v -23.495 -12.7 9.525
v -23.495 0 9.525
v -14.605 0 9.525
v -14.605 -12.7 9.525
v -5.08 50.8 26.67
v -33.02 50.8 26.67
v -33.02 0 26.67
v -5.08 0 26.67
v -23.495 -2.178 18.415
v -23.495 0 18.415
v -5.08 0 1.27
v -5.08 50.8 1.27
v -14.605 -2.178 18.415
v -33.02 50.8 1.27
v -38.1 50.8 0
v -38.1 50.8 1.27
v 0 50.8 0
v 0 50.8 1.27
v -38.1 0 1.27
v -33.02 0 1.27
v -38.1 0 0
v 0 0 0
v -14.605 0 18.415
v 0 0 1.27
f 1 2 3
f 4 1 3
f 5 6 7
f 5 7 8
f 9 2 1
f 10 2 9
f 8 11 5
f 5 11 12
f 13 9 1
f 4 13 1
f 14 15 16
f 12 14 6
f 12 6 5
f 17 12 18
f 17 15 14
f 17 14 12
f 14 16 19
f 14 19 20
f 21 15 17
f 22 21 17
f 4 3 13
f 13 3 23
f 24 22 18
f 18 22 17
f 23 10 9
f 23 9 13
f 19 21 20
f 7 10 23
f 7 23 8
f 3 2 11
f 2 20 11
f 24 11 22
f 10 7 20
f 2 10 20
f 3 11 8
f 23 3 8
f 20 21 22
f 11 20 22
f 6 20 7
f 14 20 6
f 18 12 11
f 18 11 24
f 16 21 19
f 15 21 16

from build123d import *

# Parameters (mm, degrees)
F0_W     = 38.1
F0_H     = 50.8
F1_DEPTH = 1.27
F2_W     = 27.94
F2_H     = 50.8
F3_DEPTH = 25.4
F4_W     = 8.89
F4_H     = 8.89
F5_DEPTH = 12.7
F7_DEPTH = 8.89


with BuildPart() as f1:
    # F0 (on Top) → F1 (new body)
    with BuildSketch(Plane.XY):
        with Locations((-19.05, 25.4)):
            Rectangle(F0_W, F0_H)
    extrude(amount=F1_DEPTH)

    # F2 (on face) → F3 (join)
    with BuildSketch(Plane.XY.offset(1.27)):
        with Locations((-19.05, 25.4)):
            Rectangle(F2_W, F2_H)
    extrude(amount=F3_DEPTH)

    # F4 (on face) → F5 (join)
    with BuildSketch(Plane.XZ):
        with Locations((-19.05, 13.97)):
            Rectangle(F4_W, F4_H)
    extrude(amount=F5_DEPTH)

    # F6 (on face) → F7 (cut, through all)
    with BuildSketch(Plane(origin=(-23.495, 0, 0), x_dir=(0, -1, 0), z_dir=(-1, 0, 0))):
        Polygon((12.7, 18.415), (2.17834, 18.415), (12.7, 9.525), align=None)
    extrude(amount=-F7_DEPTH, mode=Mode.SUBTRACT)


solid = f1.part
